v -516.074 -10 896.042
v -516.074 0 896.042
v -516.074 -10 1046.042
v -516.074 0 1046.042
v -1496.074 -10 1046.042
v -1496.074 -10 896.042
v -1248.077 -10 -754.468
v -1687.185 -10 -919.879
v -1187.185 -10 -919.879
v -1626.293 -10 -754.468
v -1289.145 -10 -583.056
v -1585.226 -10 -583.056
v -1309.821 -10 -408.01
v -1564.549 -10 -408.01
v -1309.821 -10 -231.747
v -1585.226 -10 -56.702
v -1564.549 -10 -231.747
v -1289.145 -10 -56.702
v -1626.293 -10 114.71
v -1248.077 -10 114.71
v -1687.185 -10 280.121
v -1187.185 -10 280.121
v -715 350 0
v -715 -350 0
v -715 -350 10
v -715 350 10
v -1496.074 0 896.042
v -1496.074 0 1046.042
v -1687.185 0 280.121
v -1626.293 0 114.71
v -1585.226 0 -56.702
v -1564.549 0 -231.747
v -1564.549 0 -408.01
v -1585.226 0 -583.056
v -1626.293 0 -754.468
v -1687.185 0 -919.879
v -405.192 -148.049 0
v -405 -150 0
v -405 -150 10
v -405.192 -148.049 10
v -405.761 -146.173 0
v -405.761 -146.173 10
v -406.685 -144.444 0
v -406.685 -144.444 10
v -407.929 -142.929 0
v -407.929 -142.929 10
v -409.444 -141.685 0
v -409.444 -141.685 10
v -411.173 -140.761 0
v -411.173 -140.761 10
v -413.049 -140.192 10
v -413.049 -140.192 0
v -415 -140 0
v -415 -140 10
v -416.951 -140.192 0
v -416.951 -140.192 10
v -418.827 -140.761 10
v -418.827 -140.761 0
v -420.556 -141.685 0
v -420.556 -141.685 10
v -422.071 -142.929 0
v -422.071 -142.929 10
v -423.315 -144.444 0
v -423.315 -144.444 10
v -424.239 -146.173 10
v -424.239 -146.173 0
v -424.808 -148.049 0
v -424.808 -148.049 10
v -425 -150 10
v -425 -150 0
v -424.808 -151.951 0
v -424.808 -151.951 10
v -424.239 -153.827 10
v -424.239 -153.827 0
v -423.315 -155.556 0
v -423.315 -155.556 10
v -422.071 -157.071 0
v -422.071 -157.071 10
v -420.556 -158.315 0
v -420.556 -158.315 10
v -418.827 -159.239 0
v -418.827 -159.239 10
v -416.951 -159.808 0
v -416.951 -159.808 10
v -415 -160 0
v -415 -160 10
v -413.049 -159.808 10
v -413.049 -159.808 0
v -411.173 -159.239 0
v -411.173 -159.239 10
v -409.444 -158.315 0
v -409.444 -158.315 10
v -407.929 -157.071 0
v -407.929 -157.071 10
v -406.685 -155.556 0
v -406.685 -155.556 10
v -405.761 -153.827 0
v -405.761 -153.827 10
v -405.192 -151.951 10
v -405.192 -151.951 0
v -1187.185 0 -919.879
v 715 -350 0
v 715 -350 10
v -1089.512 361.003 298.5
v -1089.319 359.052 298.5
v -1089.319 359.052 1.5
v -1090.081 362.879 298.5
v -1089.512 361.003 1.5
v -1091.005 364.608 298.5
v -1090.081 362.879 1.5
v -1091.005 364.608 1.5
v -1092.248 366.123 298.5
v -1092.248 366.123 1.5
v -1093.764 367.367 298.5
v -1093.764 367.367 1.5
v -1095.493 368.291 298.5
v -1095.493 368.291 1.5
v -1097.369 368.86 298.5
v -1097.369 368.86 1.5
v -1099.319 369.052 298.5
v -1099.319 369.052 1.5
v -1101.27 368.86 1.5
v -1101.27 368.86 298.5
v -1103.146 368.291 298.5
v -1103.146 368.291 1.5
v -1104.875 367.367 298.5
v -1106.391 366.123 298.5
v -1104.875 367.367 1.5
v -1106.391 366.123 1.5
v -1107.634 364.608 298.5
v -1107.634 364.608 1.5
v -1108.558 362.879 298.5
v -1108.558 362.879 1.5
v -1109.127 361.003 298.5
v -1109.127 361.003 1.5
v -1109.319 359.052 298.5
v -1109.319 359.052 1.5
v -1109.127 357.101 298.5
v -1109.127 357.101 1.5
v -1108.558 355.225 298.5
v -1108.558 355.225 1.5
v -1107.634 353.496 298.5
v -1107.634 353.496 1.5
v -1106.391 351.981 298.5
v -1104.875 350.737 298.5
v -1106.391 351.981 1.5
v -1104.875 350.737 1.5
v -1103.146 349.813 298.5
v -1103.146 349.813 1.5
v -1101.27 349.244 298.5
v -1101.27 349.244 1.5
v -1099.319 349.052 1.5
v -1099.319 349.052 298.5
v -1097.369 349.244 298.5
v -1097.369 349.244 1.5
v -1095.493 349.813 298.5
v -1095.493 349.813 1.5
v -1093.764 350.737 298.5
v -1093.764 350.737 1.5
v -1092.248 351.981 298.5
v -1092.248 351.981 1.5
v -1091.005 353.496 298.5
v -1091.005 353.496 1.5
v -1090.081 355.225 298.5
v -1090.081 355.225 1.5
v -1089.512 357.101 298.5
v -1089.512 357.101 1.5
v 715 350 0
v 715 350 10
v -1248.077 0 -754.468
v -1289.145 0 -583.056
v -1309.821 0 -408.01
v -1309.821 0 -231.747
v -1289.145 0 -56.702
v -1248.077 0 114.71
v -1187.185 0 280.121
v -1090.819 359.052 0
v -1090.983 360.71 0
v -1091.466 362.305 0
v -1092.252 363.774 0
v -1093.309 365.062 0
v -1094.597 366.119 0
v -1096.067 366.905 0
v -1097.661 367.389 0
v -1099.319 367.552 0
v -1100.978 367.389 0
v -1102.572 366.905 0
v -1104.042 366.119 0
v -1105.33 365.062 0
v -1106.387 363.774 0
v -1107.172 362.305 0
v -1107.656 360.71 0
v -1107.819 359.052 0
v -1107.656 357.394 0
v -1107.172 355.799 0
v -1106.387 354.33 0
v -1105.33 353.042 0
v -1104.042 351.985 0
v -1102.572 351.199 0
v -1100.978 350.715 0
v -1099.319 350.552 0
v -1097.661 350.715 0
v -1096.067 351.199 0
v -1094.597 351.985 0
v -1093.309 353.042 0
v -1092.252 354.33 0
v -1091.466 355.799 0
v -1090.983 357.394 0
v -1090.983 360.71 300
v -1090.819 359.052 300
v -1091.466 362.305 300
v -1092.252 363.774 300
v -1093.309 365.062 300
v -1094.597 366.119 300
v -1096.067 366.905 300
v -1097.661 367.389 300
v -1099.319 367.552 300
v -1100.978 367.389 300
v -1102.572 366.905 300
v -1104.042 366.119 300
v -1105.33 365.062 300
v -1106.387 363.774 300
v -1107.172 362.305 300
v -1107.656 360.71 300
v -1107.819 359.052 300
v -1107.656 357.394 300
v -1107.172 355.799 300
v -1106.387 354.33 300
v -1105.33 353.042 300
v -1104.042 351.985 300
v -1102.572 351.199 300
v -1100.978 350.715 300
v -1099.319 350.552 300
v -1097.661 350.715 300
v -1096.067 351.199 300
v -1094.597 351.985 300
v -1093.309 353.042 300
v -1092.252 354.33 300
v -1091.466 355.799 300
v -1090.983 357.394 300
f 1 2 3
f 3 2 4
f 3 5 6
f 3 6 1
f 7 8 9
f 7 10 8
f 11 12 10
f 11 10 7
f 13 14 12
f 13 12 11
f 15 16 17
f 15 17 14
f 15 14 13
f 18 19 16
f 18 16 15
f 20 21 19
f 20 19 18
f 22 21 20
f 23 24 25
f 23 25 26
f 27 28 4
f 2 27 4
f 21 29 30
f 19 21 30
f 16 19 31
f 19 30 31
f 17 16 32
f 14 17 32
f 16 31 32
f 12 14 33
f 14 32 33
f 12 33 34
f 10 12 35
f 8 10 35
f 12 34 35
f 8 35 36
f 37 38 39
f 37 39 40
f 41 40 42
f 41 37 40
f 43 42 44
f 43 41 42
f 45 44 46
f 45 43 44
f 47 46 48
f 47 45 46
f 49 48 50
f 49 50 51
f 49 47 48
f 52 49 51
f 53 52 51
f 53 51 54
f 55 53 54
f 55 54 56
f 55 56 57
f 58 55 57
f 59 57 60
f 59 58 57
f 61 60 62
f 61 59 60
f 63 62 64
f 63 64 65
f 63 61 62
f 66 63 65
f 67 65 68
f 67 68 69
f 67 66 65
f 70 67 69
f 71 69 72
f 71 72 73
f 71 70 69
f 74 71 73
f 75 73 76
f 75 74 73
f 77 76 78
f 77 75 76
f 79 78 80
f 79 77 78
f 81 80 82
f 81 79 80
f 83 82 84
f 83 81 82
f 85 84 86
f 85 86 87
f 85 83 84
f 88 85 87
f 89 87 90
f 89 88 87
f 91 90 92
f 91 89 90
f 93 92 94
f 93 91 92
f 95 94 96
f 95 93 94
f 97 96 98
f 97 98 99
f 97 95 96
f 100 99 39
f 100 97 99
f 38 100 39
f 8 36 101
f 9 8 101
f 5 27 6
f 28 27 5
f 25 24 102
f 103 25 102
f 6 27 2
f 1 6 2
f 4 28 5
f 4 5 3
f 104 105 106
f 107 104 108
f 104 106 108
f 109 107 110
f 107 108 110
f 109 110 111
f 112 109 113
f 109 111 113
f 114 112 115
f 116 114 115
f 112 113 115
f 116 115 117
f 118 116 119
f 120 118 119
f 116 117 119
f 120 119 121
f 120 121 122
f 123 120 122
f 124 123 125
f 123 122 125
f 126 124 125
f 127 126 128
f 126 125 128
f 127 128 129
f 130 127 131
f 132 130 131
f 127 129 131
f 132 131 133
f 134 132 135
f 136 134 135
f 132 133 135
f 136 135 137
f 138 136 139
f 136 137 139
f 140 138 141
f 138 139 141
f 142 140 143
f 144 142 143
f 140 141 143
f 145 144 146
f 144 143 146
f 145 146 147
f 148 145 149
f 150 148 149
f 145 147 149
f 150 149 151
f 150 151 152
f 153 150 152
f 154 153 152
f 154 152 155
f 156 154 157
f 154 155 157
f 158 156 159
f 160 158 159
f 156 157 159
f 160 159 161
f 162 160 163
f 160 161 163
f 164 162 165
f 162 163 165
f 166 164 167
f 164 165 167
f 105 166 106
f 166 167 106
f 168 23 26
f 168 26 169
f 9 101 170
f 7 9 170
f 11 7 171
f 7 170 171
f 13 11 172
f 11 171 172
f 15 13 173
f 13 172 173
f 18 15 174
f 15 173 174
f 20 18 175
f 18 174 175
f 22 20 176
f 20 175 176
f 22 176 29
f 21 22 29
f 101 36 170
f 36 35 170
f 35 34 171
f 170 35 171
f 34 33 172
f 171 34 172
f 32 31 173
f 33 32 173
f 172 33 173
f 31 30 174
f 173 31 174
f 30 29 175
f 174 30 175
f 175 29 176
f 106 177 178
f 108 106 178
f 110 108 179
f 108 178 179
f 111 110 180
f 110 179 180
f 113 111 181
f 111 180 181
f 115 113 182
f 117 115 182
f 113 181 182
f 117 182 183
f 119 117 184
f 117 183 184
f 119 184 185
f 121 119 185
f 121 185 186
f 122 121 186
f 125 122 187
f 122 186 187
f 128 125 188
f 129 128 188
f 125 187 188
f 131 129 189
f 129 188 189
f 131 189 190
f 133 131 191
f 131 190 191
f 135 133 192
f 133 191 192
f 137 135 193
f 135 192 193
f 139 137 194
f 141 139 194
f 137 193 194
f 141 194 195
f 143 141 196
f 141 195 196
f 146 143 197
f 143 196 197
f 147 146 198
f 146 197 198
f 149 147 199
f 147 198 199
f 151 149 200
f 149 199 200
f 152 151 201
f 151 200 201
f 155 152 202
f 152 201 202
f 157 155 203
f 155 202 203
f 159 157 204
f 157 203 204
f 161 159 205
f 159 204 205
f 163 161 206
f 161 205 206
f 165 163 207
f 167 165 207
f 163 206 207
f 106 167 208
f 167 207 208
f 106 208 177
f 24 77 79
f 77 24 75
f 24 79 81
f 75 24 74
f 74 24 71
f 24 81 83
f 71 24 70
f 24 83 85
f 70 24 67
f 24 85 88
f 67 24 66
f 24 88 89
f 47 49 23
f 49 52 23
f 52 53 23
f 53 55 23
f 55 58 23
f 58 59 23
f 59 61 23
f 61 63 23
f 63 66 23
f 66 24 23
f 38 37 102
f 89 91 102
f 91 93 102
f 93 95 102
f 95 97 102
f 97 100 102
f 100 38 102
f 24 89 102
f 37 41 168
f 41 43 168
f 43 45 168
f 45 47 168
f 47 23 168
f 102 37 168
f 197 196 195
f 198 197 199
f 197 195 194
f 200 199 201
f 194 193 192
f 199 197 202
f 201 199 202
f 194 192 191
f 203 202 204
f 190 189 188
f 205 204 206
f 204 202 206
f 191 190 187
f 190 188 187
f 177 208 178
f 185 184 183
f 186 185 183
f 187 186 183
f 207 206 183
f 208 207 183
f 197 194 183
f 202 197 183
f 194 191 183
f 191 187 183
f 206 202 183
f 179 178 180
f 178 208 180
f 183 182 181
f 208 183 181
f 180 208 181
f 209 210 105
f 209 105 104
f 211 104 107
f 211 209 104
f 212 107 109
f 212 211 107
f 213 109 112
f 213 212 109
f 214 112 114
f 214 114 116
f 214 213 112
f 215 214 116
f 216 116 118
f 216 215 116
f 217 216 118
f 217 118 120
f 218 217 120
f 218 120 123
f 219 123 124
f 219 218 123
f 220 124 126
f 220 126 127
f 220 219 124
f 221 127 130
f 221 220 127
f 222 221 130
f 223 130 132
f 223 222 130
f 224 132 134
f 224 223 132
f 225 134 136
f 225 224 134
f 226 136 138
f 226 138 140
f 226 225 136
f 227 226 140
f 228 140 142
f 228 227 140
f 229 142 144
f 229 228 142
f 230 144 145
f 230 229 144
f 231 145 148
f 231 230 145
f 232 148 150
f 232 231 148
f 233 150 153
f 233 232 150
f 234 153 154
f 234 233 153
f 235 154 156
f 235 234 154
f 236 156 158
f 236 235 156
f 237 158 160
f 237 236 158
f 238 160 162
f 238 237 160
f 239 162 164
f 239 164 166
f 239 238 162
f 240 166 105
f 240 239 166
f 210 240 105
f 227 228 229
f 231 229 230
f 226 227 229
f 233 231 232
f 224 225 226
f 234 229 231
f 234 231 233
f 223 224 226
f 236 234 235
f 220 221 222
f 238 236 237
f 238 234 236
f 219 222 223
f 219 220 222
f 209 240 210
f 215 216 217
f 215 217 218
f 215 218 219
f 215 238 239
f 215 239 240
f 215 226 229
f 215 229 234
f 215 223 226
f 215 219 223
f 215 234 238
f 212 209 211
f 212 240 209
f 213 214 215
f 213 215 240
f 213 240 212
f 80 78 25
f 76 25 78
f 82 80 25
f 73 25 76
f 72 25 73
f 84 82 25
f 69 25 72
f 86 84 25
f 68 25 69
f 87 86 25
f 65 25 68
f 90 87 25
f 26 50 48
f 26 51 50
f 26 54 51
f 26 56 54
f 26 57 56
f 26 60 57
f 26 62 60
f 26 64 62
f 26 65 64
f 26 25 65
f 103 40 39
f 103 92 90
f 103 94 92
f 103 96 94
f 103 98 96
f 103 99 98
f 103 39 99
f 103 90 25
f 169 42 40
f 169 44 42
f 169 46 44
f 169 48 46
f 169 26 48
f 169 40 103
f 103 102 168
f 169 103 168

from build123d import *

# Parameters (mm, degrees)
F0_W     = 1430
F0_H     = 700
F0_R     = 10
F1_DEPTH = 10
F3_DEPTH = 10
F4_W     = 980
F4_H     = 150
F5_DEPTH = 10
F6_R     = 10
F7_DEPTH = 300
F8_SIZE  = 1.5


with BuildPart() as f1:
    # F0 (on Top) → F1 (new body)
    with BuildSketch(Plane.XY):
        Rectangle(F0_W, F0_H)
        with Locations((-415, -150)):
            Circle(F0_R, mode=Mode.SUBTRACT)
    extrude(amount=F1_DEPTH)


with BuildPart() as f3:
    # F2 (on Front) → F3 (new body)
    with BuildSketch(Plane.XZ):
        with BuildLine():
            Line((-1687.185126, -919.878876), (-1187.185126, -919.878876))
            ThreePointArc((-1187.185126, -919.878876), (-1312.412418, -319.878876), (-1187.185126, 280.121124))
            Line((-1187.185126, 280.121124), (-1687.185126, 280.121124))
            ThreePointArc((-1687.185126, 280.121124), (-1561.957835, -319.878876), (-1687.185126, -919.878876))
        make_face()
    extrude(amount=F3_DEPTH)


with BuildPart() as f5:
    # F4 (on Front) → F5 (new body)
    with BuildSketch(Plane.XZ):
        with Locations((-1006.073756, 971.041918)):
            Rectangle(F4_W, F4_H)
    extrude(amount=F5_DEPTH)


with BuildPart() as f7:
    # F6 (on Top) → F7 (new body)
    with BuildSketch(Plane.XY):
        with Locations((-1099.319458, 359.052002)):
            Circle(F6_R)
    extrude(amount=F7_DEPTH)

    # F8
    f8_edges = [f7.edges().sort_by_distance(p)[0] for p in [
        (-1109.319458, 359.052002, 300),
        (-1109.319458, 359.052002, 0),
    ]]
    chamfer(f8_edges, length=F8_SIZE)


solid = Compound([f1.part, f3.part, f5.part, f7.part])
